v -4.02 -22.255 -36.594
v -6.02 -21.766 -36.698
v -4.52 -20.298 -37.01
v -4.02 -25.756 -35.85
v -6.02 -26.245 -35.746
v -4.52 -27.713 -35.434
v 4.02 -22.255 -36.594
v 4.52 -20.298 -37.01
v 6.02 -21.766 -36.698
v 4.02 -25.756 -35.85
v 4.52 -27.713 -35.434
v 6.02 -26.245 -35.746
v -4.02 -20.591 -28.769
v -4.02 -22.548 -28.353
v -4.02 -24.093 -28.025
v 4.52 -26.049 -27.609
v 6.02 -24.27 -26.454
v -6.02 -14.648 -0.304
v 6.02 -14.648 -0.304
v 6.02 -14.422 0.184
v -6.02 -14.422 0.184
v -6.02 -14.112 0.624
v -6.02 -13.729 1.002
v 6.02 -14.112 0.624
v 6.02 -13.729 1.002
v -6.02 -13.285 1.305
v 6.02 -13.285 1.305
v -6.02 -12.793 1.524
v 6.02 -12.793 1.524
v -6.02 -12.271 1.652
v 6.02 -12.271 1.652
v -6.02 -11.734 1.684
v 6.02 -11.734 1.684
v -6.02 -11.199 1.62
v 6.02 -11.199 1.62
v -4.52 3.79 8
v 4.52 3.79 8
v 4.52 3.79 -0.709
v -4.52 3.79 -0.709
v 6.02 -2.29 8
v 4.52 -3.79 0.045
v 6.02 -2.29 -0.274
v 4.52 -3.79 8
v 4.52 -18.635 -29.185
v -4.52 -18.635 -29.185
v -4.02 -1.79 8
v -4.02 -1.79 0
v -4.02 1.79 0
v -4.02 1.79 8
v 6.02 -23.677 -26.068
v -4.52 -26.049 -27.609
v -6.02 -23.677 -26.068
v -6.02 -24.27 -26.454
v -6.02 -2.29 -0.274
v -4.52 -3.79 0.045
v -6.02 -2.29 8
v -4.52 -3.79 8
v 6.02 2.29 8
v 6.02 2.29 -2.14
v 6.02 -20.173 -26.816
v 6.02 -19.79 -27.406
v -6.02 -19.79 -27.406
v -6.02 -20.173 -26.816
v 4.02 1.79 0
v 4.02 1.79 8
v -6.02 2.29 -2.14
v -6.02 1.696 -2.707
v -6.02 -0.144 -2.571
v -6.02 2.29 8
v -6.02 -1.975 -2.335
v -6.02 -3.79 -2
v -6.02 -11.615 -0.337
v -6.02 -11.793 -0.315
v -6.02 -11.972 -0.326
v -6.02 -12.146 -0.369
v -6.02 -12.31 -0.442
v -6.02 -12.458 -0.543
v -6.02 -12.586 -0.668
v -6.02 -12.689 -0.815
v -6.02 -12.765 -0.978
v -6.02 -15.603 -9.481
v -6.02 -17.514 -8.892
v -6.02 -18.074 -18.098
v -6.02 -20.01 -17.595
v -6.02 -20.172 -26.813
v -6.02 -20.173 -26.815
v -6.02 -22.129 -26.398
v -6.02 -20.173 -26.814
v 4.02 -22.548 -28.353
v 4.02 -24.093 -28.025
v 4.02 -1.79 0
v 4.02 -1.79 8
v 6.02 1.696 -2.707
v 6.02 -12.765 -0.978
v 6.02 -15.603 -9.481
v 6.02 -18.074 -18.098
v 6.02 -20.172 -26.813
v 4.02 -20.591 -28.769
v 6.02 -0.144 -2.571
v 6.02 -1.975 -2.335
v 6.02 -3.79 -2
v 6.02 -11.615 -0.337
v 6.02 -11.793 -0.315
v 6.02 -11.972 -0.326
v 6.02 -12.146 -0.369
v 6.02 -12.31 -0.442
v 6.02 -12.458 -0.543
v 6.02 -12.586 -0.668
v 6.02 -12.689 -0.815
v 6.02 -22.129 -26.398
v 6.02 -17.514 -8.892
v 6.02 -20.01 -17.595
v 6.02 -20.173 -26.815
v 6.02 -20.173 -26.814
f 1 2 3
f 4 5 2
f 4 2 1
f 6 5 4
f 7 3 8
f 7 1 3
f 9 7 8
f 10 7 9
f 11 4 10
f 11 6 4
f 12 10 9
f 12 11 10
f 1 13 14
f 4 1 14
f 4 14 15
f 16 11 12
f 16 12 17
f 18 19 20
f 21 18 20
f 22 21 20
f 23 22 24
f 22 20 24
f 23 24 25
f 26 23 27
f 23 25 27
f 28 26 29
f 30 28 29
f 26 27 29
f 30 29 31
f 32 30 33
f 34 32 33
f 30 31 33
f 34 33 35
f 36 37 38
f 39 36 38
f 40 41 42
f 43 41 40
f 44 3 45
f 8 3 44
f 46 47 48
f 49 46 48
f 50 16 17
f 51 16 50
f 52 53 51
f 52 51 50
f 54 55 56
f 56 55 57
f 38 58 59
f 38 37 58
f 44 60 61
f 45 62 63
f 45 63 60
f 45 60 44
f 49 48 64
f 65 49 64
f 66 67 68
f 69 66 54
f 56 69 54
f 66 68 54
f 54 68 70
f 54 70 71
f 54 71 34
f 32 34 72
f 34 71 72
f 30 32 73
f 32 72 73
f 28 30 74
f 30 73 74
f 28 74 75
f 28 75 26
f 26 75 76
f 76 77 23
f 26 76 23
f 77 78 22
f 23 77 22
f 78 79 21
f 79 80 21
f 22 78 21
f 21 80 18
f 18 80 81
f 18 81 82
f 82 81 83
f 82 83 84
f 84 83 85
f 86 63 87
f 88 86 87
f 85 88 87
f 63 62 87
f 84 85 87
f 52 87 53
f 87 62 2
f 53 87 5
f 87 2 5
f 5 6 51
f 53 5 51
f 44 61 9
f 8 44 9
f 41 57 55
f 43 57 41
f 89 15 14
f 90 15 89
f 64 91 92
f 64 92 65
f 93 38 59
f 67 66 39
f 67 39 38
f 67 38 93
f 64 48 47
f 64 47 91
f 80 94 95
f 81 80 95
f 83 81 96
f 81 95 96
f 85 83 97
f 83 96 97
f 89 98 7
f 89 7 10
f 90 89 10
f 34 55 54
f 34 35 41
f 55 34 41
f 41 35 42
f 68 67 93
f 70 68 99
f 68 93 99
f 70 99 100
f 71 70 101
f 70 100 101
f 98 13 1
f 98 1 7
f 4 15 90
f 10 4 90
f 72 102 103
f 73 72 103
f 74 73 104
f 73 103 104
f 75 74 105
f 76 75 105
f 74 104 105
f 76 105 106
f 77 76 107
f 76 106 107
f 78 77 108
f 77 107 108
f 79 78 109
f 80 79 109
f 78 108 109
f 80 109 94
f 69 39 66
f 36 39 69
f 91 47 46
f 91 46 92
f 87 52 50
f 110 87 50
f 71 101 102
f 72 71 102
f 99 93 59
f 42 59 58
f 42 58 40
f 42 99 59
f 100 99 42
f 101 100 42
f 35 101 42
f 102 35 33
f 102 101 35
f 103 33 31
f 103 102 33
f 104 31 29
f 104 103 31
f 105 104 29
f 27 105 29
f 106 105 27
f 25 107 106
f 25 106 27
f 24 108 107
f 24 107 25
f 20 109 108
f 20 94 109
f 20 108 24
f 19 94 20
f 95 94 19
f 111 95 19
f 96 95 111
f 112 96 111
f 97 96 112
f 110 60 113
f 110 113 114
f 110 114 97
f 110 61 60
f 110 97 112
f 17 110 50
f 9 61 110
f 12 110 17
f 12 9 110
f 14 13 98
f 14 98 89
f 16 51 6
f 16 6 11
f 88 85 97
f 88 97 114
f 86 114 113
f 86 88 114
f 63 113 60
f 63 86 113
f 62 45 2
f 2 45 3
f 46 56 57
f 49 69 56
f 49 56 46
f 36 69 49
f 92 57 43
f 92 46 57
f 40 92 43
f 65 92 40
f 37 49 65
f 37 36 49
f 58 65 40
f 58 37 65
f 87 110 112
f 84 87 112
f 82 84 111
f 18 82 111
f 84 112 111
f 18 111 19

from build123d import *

# Parameters (mm, degrees)
SKETCH1_W           = 12.04
SKETCH1_H           = 7.58
SKETCH1_W_2         = 8.04
SKETCH1_H_2         = 3.58
BOSS_EXTRUDE1_DEPTH = 8
SKETCH1_2_W         = 12.04
SKETCH1_2_H         = 7.58
SKETCH1_2_W_2       = 8.04
SKETCH1_2_H_2       = 3.58
BOSS_EXTRUDE2_DEPTH = 2
EXTRUDE_THIN1_DEPTH = 12.04
SKETCH5_W           = 12.04
SKETCH5_H           = 7.58
SKETCH5_W_2         = 8.04
SKETCH5_H_2         = 3.58
BOSS_EXTRUDE4_DEPTH = 8
SKETCH5_4_W         = 12.04
SKETCH5_4_H         = 7.58
BOSS_EXTRUDE5_DEPTH = 2
CHAMFER1_SIZE       = 1.5
CHAMFER2_START      = -7
CHAMFER2_DEPTH      = 14


with BuildPart() as part:
    # Sketch1 → Boss-Extrude1 (new body)
    with BuildSketch(Plane.XY):
        Rectangle(SKETCH1_W, SKETCH1_H)
        Rectangle(SKETCH1_W_2, SKETCH1_H_2, mode=Mode.SUBTRACT)
    extrude(amount=BOSS_EXTRUDE1_DEPTH)

    # Sketch1<2> → Boss-Extrude2 (add)
    # profile 1 of 2: a face of its own
    with BuildSketch(Plane.XY):
        Rectangle(SKETCH1_2_W, SKETCH1_2_H)
        Rectangle(SKETCH1_2_W_2, SKETCH1_2_H_2, mode=Mode.SUBTRACT)
    # profile 2 of 2: a face of its own
    with BuildSketch(Plane.XY):
        Rectangle(SKETCH1_2_W_2, SKETCH1_2_H_2)
    extrude(amount=-BOSS_EXTRUDE2_DEPTH)

    # Sketch3 → Extrude-Thin1 (add)
    with BuildSketch(Plane(origin=(6.02, 9.81, 0), x_dir=(0, -1, 0), z_dir=(1, 0, 0))):
        with BuildLine():
            Line((6.02, 2.744137986), (6.52, 2.744137986))
            ThreePointArc((6.52, 2.744137986), (10.07949931, 2.557592532), (13.6, 2))
            Line((13.6, 2), (21.425180806, 0.336706473))
            ThreePointArc((21.425180806, 0.336706473), (22.120268588, 0.441550315), (22.574623539, 0.977927827))
            ThreePointArc((22.574623539, 0.977927827), (26.849152106, 14.317688881), (30.219561316, 27.914054616))
            Line((30.219561316, 27.914054616), (30.401286915, 28.769006338))
            Line((30.401286915, 28.769006338), (32.357582116, 28.353182957))
            Line((32.357582116, 28.353182957), (32.175856518, 27.498231234))
            ThreePointArc((32.175856518, 27.498231234), (28.773161162, 13.771621897), (24.457685624, 0.304075332))
            ThreePointArc((24.457685624, 0.304075332), (23.094620772, -1.305057203), (21.009357424, -1.619588728))
            Line((21.009357424, -1.619588728), (13.184176618, 0.043704799))
            ThreePointArc((13.184176618, 0.043704799), (9.870442383, 0.568548741), (6.52, 0.744137986))
            Line((6.52, 0.744137986), (6.02, 0.744137986))
            Line((6.02, 0.744137986), (6.02, 2.744137986))
        make_face()
    extrude(amount=-EXTRUDE_THIN1_DEPTH)



with BuildPart() as body_2:
    # Sketch5 → Boss-Extrude4 (new body)
    with BuildSketch(Plane(origin=(0, 484.189145571, -136.063399466), x_dir=(1, 0, 0), z_dir=(0, -0.20791169081775487, -0.9781476007338067))):
        with Locations((0, 517.847527624)):
            Rectangle(SKETCH5_W, SKETCH5_H)
        with Locations((0, 517.847527624)):
            Rectangle(SKETCH5_W_2, SKETCH5_H_2, mode=Mode.SUBTRACT)
    extrude(amount=BOSS_EXTRUDE4_DEPTH)


with BuildPart() as part_1:
    add(part.part)

    add(body_2.part)  # Boss-Extrude5 merges body 2
    # Sketch5<4> → Boss-Extrude5 (add)
    with BuildSketch(Plane(origin=(0, 484.189145571, -136.063399466), x_dir=(1, 0, 0), z_dir=(0, -0.20791169081775487, -0.9781476007338067))):
        with Locations((0, 517.847527624)):
            Rectangle(SKETCH5_4_W, SKETCH5_4_H)
    extrude(amount=-BOSS_EXTRUDE5_DEPTH)

    # Chamfer1
    chamfer1_edges = [part_1.edges().sort_by_distance(p)[0] for p in [
        (6.02, -26.673085599, -30.543301906),
        (-6.02, -26.673085599, -30.543301906),
        (6.02, 3.79, 2.627931007),
        (6.02, -3.79, 4.022340595),
        (-6.02, -3.79, 4.022340595),
        (-6.02, 3.79, 2.627931007),
        (6.02, -19.258726786, -32.119272522),
        (-6.02, -19.258726786, -32.119272522),
    ]]
    chamfer(chamfer1_edges, length=CHAMFER1_SIZE)

    # Chamfer2: read off the stored shape, not the designer's step
    # Chamfer2 outline → Chamfer2 (cut)
    with BuildSketch(Plane.YZ.offset(CHAMFER2_START)):
        with BuildLine():
            Line((3.79, -2.744137986), (3.79, -0.709020541))
            Line((3.79, -0.709020541), (1.696404781, -2.706829325))
            ThreePointArc((1.696404781, -2.706829325), (2.492984056, -2.734809543), (3.29, -2.744137986))
            Line((3.29, -2.744137986), (3.79, -2.744137986))
        make_face()
        Polygon((-25.633527145, -25.652563902), (-26.049350527, -27.608859104), (-23.677231944, -26.068387284), align=None)
        with BuildLine():
            ThreePointArc((-20.172493797, -26.813342374), (-20.172815684, -26.814817596), (-20.173137561, -26.81629282))
            Line((-20.173137561, -26.81629282), (-18.634991713, -29.18482972))
            Line((-18.634991713, -29.18482972), (-18.219168332, -27.228534519))
            Line((-18.219168332, -27.228534519), (-20.172493797, -26.813342374))
        make_face()
    extrude(amount=CHAMFER2_DEPTH, mode=Mode.SUBTRACT)


solid = part_1.part
